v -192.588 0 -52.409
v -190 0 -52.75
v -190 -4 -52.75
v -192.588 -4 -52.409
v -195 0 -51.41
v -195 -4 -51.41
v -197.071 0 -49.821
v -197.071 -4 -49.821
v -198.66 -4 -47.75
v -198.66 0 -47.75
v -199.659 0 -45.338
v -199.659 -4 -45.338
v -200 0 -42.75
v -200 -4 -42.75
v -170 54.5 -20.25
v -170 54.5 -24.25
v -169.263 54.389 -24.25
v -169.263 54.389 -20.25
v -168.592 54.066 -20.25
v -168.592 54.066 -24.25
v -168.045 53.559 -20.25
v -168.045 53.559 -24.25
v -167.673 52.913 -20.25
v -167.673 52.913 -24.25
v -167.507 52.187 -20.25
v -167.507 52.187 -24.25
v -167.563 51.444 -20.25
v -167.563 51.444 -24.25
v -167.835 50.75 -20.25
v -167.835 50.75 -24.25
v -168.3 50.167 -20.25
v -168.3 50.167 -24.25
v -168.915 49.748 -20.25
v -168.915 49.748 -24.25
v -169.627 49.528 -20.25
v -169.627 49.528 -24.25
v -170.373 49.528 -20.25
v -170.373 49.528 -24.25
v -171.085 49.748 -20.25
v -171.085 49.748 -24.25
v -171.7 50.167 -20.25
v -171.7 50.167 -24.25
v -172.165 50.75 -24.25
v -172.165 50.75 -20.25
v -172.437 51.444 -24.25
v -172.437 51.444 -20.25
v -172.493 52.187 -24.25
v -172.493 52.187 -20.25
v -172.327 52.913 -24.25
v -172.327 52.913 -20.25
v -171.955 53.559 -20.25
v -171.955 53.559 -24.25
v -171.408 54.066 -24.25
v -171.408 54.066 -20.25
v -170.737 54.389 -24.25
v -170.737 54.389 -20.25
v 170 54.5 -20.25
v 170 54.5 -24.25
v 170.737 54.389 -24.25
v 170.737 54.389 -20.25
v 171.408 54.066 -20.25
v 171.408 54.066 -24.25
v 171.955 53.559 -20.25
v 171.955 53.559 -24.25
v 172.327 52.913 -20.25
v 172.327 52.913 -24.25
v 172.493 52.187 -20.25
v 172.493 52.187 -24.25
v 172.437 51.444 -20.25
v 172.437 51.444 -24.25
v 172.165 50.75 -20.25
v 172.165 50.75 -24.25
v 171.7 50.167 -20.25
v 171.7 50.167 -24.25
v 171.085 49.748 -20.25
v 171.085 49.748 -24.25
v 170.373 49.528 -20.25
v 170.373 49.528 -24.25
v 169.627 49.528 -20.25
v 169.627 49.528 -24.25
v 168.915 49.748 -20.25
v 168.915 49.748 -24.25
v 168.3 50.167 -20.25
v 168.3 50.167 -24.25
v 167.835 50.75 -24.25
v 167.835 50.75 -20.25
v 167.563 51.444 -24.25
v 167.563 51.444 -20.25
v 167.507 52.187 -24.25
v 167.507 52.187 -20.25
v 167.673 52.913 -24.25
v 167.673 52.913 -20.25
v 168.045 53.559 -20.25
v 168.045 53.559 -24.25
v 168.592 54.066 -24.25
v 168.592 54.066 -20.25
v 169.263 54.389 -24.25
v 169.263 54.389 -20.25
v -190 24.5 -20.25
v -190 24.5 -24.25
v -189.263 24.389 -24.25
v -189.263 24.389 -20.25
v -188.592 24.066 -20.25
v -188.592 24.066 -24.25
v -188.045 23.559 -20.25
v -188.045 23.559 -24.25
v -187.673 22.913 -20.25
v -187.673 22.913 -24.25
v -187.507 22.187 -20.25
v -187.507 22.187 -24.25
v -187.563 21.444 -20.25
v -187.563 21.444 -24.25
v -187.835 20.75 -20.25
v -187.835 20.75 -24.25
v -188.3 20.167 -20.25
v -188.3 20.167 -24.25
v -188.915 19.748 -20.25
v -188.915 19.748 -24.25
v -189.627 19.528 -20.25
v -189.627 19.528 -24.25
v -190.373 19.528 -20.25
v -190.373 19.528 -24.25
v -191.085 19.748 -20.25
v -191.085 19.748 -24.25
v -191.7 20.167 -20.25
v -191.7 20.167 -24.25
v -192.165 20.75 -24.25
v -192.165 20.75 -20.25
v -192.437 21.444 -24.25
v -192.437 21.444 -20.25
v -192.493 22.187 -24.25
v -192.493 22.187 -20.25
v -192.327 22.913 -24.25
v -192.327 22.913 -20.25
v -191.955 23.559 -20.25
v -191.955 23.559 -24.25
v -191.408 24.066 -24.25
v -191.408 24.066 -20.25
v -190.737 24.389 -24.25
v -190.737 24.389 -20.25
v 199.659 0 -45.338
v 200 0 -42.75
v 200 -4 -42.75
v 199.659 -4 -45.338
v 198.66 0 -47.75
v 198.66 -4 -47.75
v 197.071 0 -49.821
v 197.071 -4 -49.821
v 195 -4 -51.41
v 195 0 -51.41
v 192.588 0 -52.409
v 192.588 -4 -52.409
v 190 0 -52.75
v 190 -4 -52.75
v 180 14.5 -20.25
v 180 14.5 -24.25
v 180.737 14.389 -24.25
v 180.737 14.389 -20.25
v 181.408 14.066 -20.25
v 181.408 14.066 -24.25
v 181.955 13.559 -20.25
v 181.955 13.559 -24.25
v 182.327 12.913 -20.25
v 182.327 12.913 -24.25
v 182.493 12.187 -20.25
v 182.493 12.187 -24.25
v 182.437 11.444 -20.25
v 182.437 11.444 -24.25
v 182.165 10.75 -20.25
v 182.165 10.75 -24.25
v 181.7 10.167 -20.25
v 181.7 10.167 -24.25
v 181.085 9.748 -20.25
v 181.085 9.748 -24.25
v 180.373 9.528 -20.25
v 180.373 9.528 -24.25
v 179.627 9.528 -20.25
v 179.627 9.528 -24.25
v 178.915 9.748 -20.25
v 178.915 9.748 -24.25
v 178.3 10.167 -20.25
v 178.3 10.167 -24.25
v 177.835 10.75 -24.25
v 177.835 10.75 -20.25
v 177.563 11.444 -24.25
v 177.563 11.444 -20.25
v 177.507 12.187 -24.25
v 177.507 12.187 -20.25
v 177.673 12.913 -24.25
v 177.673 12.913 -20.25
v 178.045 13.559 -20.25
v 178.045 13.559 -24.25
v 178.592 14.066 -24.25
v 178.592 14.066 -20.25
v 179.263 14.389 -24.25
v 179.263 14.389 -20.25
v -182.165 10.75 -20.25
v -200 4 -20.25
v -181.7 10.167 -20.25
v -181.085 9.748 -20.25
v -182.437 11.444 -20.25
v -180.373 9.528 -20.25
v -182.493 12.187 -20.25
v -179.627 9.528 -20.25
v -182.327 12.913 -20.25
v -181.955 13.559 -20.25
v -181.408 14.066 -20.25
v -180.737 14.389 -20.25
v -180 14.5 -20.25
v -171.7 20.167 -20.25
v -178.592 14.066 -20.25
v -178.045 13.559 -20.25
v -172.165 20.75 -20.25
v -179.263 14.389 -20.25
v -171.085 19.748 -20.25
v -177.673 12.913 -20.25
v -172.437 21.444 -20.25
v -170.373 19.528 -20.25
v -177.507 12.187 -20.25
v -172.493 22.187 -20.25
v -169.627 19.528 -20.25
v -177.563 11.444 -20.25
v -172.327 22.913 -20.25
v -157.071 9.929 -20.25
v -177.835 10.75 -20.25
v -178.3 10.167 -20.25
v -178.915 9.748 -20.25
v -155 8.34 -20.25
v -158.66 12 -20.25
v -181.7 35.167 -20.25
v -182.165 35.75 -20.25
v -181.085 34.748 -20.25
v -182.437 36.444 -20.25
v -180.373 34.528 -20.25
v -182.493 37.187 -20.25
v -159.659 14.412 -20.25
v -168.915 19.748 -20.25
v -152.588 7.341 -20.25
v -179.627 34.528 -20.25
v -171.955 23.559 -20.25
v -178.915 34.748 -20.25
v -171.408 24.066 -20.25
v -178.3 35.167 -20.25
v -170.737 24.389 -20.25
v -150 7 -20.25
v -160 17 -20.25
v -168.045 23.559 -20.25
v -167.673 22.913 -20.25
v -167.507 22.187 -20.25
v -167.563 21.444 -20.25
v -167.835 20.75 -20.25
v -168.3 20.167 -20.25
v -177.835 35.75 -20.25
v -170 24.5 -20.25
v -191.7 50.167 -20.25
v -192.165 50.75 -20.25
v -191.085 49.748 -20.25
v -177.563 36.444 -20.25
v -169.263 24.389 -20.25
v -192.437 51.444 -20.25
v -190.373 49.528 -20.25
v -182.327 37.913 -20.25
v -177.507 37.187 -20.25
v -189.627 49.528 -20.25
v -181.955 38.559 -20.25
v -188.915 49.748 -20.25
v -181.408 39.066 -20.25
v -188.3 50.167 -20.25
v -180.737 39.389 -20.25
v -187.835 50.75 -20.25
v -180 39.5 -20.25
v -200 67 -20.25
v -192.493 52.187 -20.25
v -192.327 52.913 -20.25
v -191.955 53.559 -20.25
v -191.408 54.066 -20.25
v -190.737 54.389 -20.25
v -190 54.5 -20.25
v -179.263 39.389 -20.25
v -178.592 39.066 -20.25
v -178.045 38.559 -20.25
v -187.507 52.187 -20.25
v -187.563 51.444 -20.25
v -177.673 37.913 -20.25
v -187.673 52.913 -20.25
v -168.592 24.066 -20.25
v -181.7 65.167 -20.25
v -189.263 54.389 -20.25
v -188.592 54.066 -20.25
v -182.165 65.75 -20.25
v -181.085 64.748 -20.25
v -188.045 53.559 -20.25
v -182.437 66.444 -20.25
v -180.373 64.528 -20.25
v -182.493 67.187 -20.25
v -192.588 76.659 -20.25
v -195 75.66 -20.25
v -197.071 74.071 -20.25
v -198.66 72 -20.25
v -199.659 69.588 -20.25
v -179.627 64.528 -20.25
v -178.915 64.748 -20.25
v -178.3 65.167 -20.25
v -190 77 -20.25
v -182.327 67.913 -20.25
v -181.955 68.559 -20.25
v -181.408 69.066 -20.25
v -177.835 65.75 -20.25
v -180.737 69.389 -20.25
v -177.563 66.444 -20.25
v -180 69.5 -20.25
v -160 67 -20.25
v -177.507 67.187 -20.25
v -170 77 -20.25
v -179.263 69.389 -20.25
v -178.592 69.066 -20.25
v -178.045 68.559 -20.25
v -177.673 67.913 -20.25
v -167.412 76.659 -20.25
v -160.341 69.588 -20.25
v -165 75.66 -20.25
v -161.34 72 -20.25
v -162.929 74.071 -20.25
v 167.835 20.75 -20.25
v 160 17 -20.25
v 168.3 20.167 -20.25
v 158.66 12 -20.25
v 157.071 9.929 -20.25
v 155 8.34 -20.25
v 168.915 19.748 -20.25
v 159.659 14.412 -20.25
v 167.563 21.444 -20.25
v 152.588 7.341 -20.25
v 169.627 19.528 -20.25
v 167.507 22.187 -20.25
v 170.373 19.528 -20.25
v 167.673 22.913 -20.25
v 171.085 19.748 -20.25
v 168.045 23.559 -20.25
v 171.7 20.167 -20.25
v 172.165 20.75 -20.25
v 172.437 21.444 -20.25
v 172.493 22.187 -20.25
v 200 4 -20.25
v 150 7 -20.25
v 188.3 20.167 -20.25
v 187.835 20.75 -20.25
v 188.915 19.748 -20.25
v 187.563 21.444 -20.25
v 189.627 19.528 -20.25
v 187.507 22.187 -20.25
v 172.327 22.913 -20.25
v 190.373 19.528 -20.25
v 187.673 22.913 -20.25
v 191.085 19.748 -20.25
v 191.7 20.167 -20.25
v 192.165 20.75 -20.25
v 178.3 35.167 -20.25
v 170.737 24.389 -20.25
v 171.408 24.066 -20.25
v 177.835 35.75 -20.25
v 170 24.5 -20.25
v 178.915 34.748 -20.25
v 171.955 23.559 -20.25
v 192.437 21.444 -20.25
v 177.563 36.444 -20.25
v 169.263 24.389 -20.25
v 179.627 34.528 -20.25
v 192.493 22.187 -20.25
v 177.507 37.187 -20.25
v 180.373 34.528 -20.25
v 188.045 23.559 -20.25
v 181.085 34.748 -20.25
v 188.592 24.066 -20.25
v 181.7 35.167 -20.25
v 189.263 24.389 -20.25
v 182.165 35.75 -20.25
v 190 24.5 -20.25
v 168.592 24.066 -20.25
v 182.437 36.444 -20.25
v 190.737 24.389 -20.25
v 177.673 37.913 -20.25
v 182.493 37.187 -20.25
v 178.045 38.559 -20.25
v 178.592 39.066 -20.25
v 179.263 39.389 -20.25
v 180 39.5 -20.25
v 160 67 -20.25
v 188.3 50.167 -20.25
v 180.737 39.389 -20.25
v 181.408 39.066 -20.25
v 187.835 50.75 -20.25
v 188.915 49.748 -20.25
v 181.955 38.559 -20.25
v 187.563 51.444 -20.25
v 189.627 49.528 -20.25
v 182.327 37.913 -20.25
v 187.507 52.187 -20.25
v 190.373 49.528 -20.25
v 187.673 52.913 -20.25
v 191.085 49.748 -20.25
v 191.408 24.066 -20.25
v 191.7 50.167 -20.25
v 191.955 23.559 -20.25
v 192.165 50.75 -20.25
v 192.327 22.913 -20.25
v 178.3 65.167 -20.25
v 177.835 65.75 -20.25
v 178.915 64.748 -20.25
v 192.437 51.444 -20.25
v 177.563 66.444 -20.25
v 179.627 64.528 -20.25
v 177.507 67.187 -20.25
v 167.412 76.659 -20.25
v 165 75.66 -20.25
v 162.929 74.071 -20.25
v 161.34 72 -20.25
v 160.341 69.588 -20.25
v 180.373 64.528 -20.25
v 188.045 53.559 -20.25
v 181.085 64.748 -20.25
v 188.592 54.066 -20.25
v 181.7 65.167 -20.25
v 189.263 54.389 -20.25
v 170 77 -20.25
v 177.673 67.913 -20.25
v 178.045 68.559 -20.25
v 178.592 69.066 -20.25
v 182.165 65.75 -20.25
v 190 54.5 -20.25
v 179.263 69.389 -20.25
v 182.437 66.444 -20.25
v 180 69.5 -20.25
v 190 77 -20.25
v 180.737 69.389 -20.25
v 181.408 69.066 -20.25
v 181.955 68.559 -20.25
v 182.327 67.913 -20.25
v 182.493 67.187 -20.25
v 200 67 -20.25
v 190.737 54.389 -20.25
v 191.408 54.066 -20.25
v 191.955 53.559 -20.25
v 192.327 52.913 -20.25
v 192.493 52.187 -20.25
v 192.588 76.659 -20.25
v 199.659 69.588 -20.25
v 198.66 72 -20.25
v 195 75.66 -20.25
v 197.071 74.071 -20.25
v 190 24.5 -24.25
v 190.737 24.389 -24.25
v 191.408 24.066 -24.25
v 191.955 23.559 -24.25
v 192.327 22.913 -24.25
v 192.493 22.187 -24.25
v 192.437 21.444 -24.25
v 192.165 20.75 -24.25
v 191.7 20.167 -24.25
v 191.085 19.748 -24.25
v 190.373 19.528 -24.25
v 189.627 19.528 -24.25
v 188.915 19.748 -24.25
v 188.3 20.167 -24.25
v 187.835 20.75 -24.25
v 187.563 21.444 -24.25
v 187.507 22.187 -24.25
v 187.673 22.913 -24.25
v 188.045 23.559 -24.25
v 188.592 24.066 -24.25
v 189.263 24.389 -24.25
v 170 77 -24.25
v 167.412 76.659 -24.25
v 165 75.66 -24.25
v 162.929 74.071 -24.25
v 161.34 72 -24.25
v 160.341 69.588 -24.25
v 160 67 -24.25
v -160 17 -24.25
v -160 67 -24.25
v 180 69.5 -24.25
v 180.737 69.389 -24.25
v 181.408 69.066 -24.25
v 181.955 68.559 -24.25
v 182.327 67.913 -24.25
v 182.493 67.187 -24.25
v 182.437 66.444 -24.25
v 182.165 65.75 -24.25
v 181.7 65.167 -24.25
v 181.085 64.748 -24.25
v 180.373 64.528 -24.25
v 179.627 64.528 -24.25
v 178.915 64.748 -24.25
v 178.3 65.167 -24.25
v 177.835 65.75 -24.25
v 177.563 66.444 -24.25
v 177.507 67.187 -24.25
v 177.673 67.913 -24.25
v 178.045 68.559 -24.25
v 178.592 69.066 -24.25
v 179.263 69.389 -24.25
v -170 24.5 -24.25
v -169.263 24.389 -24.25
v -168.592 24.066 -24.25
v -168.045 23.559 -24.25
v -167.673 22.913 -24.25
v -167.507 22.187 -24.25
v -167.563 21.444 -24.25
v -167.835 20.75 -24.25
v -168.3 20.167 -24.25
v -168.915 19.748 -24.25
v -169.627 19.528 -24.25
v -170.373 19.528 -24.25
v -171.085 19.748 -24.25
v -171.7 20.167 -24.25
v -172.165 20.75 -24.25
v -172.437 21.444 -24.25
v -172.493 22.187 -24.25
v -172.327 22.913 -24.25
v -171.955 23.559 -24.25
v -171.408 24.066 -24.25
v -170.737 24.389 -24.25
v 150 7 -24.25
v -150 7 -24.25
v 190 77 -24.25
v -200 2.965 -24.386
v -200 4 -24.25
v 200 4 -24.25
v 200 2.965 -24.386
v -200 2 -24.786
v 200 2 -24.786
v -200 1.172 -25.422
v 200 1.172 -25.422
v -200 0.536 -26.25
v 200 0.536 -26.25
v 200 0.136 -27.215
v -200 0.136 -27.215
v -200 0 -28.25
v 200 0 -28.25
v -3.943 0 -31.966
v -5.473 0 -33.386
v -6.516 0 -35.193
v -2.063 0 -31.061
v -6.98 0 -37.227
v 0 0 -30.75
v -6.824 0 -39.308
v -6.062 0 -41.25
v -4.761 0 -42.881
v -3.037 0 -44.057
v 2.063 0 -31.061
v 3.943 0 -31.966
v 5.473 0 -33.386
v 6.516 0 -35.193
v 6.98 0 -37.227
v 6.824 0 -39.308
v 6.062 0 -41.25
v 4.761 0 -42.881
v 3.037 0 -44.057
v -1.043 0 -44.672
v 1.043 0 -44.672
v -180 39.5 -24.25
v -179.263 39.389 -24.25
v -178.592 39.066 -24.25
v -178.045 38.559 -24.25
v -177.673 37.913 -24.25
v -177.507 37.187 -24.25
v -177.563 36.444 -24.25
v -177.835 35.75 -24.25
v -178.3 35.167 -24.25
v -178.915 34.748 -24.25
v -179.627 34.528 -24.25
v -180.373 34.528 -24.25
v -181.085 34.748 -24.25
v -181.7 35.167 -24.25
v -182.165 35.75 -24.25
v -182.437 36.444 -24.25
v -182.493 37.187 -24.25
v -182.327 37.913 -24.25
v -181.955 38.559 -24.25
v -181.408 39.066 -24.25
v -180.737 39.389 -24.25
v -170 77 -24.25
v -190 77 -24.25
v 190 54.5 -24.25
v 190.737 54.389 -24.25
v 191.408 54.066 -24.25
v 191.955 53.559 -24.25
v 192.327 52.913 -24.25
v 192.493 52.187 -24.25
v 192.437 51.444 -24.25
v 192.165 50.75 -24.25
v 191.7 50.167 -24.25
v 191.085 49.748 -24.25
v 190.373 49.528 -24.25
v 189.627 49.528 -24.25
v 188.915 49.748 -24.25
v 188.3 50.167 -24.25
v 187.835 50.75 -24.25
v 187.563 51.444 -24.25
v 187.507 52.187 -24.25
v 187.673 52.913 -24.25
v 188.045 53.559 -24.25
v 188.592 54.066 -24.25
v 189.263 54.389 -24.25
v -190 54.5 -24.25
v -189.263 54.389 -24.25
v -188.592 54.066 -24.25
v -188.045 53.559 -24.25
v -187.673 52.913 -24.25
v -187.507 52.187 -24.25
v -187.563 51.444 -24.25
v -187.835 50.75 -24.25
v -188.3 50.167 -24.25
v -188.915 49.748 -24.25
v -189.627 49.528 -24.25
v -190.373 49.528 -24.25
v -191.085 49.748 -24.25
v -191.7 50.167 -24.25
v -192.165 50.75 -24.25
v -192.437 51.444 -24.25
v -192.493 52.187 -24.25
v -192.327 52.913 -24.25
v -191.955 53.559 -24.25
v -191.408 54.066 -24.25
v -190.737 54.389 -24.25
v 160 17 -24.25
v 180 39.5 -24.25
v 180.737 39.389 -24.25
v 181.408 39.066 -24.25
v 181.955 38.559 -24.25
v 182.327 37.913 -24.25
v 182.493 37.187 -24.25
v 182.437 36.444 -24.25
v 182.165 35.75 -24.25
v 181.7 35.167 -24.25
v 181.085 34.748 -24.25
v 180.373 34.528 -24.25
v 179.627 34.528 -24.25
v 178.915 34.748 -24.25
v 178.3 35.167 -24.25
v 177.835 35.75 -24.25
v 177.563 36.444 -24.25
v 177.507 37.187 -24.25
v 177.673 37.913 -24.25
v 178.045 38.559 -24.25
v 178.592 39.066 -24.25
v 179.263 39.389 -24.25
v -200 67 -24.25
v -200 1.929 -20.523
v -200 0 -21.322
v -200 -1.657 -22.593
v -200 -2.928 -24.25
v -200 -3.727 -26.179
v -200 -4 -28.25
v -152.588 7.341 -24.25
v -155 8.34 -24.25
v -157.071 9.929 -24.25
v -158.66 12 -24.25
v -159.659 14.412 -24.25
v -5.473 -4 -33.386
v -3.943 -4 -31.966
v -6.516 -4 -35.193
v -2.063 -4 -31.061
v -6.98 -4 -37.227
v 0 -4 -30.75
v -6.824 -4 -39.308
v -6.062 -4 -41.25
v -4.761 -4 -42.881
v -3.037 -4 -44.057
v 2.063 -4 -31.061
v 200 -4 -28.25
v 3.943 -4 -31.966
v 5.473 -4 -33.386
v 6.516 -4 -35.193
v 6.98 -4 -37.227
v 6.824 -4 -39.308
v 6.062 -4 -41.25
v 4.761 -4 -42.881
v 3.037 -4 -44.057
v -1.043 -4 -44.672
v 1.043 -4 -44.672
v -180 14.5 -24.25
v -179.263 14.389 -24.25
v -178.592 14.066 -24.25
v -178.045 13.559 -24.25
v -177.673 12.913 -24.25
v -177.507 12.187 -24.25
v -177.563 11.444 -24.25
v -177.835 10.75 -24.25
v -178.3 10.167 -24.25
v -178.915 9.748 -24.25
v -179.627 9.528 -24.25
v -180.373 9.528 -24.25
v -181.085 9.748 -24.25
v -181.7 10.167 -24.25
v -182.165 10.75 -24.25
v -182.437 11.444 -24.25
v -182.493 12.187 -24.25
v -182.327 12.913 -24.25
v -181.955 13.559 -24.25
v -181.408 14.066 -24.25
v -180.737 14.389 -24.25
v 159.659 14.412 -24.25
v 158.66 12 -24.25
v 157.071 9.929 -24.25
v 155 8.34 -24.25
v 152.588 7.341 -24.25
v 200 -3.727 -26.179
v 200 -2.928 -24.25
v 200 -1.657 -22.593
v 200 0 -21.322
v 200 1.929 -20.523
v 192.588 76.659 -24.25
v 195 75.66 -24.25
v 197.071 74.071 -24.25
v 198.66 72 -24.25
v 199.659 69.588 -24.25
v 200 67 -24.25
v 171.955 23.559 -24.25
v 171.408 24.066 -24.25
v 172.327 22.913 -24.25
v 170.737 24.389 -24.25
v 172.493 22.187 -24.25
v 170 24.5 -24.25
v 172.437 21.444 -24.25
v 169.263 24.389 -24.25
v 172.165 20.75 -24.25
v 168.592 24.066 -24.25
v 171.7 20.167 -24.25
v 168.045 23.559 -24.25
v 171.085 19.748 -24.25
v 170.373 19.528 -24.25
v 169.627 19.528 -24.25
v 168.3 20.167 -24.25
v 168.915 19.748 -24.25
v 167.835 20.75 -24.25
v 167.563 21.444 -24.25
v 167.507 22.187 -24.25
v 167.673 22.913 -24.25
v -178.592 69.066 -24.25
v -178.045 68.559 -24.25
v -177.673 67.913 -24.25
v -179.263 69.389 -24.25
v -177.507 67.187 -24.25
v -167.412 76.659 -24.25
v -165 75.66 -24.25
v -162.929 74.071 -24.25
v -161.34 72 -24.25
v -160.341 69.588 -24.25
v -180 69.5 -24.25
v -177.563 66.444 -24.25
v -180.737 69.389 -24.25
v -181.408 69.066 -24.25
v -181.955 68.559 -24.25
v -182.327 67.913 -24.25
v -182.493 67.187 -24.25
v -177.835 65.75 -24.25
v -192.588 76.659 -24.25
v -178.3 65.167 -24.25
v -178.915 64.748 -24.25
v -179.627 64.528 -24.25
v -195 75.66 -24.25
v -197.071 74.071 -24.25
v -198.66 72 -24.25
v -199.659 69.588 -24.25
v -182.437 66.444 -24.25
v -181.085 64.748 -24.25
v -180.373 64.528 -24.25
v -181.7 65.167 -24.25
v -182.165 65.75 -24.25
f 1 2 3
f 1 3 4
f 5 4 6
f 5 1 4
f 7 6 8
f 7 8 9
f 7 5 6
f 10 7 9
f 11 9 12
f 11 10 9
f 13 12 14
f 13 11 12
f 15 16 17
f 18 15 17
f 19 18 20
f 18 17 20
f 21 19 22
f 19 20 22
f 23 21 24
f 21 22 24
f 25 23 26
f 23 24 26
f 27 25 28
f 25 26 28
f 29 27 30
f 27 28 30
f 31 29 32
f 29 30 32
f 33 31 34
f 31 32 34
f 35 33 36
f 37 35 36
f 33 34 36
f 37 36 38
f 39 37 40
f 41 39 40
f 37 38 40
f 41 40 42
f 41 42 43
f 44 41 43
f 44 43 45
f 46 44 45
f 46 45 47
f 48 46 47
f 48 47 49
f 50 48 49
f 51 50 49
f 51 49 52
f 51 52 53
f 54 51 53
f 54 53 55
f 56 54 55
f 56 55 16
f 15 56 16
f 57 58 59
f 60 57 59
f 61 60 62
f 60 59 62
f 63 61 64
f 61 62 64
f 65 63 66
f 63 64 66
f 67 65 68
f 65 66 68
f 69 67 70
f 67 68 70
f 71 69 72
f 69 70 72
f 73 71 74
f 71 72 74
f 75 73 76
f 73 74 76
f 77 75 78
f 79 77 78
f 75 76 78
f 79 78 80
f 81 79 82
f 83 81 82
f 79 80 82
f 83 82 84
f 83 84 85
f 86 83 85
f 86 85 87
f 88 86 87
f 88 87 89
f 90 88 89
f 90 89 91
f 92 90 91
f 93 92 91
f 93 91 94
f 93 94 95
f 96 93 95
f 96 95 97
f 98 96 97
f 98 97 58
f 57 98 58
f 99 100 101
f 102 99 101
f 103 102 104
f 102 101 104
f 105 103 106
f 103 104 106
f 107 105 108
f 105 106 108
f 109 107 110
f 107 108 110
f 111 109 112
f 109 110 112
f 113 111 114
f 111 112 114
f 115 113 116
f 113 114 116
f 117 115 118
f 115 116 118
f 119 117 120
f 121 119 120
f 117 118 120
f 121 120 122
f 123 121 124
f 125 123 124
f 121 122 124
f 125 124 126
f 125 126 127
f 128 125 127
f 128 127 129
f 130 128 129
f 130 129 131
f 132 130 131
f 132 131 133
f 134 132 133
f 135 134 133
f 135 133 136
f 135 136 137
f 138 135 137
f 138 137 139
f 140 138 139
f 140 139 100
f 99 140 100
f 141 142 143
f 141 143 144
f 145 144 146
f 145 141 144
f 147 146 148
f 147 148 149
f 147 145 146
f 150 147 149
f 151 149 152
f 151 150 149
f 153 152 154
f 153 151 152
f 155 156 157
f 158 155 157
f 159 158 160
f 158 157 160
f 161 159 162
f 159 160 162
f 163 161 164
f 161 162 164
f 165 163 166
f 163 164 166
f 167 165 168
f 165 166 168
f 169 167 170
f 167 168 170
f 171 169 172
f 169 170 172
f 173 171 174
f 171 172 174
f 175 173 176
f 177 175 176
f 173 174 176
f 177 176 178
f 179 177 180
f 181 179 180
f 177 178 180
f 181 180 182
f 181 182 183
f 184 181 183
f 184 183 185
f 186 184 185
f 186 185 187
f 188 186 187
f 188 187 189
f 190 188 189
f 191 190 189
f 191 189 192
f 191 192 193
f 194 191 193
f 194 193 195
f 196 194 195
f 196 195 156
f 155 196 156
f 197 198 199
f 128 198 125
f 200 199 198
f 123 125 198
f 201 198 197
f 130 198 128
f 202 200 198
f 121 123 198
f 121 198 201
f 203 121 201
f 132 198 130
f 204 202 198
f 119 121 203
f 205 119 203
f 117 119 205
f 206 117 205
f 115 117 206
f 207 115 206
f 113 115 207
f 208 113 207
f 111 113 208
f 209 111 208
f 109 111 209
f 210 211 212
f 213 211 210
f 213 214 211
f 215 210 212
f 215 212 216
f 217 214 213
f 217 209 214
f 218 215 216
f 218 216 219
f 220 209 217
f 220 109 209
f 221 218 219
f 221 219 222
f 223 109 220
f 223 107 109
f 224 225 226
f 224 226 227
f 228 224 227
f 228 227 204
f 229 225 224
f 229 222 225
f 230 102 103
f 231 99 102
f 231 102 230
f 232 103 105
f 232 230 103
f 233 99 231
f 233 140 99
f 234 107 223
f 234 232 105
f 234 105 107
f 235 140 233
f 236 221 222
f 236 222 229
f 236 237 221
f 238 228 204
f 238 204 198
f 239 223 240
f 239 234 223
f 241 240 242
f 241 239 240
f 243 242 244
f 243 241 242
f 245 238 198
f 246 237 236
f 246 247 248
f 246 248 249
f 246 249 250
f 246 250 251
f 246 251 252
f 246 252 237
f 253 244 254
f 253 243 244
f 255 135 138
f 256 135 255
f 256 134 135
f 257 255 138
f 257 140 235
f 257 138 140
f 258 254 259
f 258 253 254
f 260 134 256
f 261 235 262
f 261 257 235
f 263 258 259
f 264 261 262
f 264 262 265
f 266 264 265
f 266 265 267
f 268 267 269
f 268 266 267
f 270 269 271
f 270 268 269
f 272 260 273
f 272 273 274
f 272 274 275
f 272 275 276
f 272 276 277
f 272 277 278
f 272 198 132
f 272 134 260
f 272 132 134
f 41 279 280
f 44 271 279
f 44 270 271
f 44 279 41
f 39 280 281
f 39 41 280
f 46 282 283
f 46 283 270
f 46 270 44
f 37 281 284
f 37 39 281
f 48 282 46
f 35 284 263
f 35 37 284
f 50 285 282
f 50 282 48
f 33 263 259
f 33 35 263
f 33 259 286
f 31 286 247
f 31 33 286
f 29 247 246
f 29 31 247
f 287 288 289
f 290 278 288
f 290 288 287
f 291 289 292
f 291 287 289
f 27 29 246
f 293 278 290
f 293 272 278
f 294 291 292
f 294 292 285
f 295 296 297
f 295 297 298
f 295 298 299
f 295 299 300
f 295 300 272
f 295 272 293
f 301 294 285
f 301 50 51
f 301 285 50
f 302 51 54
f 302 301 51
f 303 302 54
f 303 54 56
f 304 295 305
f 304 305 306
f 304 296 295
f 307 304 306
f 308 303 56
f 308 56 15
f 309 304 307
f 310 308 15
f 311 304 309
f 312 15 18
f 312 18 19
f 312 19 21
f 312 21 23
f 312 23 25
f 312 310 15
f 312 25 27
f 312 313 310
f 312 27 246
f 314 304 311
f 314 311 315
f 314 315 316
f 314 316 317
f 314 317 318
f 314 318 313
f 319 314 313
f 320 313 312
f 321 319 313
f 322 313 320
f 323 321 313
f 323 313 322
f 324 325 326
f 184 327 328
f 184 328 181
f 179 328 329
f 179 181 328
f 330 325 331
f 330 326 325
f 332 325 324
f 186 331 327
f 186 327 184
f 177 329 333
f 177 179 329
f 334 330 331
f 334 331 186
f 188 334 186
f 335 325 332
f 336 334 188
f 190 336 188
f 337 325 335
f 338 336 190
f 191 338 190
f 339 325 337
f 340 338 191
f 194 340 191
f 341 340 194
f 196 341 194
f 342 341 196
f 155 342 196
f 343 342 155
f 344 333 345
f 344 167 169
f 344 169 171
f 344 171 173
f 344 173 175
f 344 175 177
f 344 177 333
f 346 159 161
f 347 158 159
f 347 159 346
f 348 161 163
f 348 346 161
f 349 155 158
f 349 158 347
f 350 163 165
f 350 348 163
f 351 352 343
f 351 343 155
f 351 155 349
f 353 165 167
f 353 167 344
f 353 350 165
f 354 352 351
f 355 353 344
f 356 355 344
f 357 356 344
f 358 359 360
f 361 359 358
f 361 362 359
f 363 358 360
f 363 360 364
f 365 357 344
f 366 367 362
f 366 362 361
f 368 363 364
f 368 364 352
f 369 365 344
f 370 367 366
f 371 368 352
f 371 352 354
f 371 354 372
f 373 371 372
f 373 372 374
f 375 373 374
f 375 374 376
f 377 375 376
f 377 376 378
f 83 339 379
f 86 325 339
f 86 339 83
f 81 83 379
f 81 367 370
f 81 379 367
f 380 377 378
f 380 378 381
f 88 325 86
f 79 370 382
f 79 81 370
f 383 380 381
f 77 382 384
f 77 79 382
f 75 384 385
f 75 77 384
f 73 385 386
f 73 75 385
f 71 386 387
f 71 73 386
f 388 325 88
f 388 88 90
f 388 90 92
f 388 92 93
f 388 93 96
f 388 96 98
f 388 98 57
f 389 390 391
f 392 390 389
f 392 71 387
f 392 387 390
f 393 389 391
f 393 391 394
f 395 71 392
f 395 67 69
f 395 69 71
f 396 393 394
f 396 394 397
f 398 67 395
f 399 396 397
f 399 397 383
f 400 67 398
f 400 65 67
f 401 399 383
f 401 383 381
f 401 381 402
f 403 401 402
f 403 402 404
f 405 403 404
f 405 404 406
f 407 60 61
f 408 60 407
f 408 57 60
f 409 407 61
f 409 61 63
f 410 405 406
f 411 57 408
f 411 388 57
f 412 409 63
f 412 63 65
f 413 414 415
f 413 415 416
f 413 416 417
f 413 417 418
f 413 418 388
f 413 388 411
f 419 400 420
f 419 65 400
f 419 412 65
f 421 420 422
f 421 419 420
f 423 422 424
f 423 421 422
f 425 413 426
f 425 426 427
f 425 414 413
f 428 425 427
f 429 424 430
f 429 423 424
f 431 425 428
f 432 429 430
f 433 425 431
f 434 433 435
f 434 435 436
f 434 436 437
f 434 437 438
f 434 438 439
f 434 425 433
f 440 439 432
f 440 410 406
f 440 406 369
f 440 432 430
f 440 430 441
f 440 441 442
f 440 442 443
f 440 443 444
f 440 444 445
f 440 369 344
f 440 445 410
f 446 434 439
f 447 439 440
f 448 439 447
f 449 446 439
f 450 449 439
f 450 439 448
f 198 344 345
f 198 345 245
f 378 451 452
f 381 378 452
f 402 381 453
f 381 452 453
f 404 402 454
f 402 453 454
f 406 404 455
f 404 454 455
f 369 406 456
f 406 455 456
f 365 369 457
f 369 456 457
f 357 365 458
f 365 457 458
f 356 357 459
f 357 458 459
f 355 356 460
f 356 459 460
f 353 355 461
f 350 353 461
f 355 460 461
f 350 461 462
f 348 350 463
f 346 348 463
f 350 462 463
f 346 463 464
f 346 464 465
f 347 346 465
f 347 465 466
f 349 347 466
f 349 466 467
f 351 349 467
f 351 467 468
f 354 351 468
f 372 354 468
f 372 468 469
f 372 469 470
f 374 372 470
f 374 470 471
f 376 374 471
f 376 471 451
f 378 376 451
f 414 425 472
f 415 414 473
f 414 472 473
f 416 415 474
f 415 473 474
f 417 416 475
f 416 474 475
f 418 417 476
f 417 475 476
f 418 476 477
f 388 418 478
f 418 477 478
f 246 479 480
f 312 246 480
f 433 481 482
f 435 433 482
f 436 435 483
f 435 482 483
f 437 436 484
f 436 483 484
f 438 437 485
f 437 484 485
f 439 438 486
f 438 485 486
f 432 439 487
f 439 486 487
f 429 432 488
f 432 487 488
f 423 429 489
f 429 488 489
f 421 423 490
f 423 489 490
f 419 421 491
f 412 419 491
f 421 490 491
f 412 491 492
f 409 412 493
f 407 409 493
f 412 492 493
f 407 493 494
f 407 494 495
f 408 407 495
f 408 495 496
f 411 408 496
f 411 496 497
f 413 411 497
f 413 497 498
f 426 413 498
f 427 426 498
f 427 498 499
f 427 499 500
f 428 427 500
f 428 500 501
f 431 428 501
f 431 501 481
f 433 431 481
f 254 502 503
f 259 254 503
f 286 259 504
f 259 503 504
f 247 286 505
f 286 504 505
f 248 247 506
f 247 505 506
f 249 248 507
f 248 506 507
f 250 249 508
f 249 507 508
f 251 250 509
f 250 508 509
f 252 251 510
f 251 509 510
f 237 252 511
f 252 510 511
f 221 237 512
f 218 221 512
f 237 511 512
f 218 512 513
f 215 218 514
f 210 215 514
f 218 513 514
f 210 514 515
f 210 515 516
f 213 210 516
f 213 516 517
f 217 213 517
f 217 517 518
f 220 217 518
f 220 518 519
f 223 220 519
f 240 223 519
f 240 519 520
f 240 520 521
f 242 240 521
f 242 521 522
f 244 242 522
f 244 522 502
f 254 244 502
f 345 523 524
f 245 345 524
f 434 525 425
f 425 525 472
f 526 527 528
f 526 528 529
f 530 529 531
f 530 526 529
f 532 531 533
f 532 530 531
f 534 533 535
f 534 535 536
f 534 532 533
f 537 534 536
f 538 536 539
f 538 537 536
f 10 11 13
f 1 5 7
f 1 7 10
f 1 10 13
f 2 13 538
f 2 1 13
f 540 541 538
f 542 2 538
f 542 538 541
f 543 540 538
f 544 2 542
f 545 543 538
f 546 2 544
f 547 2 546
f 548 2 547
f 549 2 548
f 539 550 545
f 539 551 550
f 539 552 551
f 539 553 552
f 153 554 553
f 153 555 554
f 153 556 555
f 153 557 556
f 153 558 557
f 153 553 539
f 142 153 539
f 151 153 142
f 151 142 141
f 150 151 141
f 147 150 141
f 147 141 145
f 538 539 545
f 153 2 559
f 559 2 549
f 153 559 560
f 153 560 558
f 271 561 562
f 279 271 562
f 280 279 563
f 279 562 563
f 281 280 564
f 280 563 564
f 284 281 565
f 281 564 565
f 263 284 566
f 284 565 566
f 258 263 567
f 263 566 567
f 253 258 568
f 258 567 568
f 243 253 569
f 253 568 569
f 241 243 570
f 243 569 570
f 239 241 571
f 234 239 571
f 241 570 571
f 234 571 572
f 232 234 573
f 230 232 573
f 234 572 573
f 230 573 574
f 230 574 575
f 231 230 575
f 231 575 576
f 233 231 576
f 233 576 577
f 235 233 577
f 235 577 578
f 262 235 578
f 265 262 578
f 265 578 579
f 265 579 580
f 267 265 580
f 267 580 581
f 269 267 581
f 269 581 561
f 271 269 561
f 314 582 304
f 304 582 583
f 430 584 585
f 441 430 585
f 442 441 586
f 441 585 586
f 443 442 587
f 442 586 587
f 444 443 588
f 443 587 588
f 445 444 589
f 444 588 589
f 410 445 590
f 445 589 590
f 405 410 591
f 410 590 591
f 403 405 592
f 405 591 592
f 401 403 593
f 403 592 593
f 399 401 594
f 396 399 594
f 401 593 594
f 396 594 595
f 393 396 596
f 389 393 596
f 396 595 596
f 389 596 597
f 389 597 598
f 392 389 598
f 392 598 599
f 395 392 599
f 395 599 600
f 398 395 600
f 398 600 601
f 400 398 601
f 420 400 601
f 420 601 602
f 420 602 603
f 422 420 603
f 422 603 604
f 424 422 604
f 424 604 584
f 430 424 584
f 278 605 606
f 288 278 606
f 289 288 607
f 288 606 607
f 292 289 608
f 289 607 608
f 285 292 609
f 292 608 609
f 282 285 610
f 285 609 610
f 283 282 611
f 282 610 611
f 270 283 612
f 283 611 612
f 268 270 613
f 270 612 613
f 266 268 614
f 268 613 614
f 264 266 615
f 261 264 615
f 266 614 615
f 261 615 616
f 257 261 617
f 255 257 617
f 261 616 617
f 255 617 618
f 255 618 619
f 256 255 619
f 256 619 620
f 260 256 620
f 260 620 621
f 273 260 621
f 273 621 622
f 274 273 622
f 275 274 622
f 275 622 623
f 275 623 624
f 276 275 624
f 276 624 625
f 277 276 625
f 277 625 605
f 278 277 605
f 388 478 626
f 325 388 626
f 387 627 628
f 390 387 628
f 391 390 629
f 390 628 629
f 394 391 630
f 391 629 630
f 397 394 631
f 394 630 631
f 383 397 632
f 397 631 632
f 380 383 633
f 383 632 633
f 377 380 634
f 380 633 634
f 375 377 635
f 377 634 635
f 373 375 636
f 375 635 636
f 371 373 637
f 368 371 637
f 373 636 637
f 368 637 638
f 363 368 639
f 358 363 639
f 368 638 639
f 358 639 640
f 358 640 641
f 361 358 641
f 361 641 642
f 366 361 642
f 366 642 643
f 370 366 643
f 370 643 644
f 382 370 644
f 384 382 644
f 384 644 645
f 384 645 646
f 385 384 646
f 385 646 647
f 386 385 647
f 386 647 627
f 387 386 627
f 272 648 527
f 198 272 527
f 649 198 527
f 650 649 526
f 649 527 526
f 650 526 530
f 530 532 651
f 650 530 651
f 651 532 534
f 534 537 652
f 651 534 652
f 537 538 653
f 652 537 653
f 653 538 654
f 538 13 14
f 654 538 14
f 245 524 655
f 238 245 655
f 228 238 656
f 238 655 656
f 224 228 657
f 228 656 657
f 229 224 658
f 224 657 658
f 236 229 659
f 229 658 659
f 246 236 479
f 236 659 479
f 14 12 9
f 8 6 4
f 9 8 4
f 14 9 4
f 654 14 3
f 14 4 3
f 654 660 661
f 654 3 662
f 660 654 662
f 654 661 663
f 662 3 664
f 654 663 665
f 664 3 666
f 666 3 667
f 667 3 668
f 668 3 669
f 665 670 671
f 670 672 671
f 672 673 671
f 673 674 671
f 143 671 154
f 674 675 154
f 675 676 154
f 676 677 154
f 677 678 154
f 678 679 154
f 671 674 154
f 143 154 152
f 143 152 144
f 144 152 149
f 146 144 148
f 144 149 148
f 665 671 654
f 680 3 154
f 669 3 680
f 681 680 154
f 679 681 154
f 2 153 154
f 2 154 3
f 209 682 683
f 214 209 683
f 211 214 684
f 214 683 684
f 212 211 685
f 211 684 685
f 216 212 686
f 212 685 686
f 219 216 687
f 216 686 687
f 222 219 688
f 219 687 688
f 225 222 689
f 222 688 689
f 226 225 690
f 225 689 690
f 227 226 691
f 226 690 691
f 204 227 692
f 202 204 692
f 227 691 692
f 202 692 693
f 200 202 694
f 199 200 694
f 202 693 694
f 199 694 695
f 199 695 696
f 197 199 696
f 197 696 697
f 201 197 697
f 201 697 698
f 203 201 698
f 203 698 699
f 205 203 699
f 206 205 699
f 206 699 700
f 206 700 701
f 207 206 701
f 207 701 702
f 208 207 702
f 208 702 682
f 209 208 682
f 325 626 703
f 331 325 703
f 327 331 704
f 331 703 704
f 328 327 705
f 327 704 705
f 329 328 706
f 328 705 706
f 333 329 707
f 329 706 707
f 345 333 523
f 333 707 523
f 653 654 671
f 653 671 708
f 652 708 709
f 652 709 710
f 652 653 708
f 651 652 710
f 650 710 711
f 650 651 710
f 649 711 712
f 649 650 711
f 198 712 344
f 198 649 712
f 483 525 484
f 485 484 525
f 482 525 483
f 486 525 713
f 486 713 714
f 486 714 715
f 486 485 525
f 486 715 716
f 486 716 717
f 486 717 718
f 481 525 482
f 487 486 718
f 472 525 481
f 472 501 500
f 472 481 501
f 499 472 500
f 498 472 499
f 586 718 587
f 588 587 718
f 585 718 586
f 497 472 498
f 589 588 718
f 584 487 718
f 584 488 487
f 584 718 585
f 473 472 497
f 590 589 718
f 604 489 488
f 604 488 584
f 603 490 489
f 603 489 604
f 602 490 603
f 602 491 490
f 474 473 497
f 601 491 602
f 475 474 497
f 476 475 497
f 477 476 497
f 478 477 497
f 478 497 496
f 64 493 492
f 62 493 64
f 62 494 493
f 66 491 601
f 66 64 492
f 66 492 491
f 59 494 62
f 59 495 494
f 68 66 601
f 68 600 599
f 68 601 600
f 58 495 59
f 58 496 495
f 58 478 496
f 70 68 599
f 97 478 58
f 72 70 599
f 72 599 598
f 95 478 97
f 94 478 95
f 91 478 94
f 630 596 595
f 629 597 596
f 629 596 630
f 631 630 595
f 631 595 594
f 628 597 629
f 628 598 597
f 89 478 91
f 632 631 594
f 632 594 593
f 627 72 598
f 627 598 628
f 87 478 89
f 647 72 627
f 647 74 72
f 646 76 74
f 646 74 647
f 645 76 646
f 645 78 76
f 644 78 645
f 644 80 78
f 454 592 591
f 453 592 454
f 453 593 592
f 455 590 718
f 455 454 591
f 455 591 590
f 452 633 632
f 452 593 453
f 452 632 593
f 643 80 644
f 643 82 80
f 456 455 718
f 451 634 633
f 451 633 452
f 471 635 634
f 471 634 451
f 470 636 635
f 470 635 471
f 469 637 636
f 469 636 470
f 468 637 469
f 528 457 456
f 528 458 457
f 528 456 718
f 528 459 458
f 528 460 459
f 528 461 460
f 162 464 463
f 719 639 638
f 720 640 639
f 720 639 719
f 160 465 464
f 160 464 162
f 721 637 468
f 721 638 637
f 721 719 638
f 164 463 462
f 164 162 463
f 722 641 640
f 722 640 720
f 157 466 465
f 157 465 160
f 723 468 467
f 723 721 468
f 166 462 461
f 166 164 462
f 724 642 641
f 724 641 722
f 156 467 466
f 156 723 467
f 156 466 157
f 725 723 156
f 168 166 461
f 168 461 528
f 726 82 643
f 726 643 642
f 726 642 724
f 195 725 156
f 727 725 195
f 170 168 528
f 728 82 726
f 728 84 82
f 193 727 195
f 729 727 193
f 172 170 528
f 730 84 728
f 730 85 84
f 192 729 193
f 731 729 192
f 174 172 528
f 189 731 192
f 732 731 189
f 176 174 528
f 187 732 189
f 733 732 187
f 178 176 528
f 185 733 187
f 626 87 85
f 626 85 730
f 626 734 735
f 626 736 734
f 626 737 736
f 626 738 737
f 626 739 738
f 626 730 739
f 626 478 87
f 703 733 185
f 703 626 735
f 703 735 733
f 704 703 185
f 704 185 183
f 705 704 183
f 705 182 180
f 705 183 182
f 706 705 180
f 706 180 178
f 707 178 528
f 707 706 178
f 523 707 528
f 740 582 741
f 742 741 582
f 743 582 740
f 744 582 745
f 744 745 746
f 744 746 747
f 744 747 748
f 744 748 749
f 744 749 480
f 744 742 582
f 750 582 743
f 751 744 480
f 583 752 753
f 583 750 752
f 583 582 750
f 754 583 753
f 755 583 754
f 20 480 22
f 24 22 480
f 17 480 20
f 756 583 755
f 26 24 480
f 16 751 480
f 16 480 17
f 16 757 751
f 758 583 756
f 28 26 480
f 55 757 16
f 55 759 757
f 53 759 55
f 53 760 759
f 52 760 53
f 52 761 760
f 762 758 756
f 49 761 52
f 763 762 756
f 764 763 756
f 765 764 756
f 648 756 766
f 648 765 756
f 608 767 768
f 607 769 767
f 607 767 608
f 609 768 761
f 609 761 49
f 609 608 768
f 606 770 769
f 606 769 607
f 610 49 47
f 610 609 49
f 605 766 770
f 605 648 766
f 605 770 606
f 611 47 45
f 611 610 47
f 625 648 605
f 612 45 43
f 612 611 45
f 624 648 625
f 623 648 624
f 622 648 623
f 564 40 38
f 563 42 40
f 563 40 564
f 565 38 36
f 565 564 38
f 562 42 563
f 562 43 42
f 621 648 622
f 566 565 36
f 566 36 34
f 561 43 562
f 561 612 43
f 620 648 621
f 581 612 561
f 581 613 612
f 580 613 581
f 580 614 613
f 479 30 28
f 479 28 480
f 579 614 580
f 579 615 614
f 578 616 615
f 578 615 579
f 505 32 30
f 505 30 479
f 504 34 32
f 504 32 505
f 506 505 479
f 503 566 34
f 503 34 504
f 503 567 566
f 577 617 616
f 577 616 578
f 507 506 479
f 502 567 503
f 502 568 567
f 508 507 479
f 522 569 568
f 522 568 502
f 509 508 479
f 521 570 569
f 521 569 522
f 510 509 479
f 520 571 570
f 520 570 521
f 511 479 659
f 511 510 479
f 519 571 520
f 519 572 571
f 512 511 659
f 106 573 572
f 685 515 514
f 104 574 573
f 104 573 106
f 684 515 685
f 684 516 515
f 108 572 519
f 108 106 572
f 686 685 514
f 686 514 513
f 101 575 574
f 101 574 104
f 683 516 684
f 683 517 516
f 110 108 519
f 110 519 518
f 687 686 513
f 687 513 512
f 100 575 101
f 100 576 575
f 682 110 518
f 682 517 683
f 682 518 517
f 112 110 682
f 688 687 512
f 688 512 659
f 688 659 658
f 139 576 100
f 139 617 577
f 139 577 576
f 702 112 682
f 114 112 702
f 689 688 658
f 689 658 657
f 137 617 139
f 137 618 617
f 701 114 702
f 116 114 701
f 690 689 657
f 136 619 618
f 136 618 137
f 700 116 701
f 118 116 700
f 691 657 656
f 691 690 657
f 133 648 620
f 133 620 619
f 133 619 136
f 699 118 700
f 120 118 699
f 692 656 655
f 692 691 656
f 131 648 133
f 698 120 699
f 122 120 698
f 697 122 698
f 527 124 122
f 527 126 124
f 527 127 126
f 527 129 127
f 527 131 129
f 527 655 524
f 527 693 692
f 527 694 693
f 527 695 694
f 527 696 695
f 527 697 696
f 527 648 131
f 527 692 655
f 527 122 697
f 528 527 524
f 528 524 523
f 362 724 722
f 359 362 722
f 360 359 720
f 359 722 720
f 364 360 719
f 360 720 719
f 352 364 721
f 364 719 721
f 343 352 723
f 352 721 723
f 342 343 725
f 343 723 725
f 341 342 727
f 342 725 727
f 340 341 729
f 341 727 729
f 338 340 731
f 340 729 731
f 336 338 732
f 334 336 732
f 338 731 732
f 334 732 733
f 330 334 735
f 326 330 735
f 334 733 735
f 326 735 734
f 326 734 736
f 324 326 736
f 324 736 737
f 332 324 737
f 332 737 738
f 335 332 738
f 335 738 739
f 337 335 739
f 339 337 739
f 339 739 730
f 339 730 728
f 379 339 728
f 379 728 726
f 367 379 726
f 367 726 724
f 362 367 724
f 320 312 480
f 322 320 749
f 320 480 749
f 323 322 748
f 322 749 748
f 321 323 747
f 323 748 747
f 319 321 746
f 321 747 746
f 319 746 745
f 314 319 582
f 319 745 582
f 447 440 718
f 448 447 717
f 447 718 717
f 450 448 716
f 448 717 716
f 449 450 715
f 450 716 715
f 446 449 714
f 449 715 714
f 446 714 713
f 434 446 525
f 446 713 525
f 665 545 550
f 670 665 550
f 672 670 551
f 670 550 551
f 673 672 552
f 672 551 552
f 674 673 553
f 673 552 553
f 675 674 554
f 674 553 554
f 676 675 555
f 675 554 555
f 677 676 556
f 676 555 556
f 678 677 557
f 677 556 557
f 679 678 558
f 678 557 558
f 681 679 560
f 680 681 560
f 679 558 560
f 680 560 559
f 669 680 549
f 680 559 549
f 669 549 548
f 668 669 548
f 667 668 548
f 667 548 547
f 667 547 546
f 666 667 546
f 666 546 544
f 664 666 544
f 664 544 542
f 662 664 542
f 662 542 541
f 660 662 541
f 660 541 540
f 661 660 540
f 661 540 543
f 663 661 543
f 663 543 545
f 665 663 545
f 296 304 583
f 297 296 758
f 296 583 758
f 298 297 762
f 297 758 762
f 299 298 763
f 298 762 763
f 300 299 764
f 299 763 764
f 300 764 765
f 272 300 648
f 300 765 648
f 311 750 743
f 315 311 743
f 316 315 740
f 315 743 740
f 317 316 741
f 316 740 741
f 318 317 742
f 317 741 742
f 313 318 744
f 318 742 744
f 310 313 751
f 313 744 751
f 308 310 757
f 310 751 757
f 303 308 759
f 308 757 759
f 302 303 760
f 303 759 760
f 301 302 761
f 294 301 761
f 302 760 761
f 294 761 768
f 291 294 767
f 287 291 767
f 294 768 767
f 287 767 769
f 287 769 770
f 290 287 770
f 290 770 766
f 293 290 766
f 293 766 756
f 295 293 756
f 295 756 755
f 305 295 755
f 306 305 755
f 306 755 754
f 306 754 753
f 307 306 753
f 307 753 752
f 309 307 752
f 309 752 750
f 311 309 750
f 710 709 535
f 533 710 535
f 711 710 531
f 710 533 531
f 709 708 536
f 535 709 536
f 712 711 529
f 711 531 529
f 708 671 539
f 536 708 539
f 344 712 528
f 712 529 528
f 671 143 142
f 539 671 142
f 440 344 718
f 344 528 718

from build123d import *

# Parameters (mm, degrees)
BRIDA_BASE1_DEPTH             = 4
PLIEGUE_START                 = -21.07192
PLIEGUE_CROQUIZADO1_OUTLINE_W = 400
PLIEGUE_CROQUIZADO1_OUTLINE_H = 4
PLIEGUE_CROQUIZADO1_DEPTH     = 73.82192
PLIEGUE_START_2               = -24.25
PLIEGUE_CROQUIZADO1_2_DEPTH   = 0.02192
PLIEGUE_START_3               = -28.25
PLIEGUE_CROQUIZADO1_3_DEPTH   = 8
PLIEGUE_START_4               = -200
PLIEGUE_CROQUIZADO1_4_DEPTH   = 400
CROQUIS8_R                    = 7
CORTAR_EXTRUIR2_DEPTH         = 10
CORTAR_EXTRUIR3_REACH         = 218.197
CROQUIS9_R                    = 2.5


with BuildPart() as part:
    # Brida base1: sheet metal written as solids
    # Croquis1 → Brida base1 (new body)
    with BuildSketch(Plane(origin=(0, 0, 0), x_dir=(1, 0, 0), z_dir=(0, 1, 0))):
        with BuildLine():
            Line((170, -52.75), (190, -52.75))
            ThreePointArc((190, -52.75), (197.071067812, -49.821067812), (200, -42.75))
            Line((200, -42.75), (200, 42.75))
            ThreePointArc((200, 42.75), (197.071067812, 49.821067812), (190, 52.75))
            Line((190, 52.75), (-190, 52.75))
            ThreePointArc((-190, 52.75), (-197.071067812, 49.821067812), (-200, 42.75))
            Line((-200, 42.75), (-200, -42.75))
            ThreePointArc((-200, -42.75), (-197.071067812, -49.821067812), (-190, -52.75))
            Line((-190, -52.75), (-170, -52.75))
            ThreePointArc((-170, -52.75), (-162.928932188, -49.821067812), (-160, -42.75))
            Line((-160, -42.75), (-160, 7.25))
            ThreePointArc((-160, 7.25), (-157.071067812, 14.321067812), (-150, 17.25))
            Line((-150, 17.25), (150, 17.25))
            ThreePointArc((150, 17.25), (157.071067812, 14.321067812), (160, 7.25))
            Line((160, 7.25), (160, -42.75))
            ThreePointArc((160, -42.75), (162.928932188, -49.821067812), (170, -52.75))
        make_face()
    extrude(amount=-BRIDA_BASE1_DEPTH)

    # Pliegue croquizado1: read off the stored shape, not the designer's step
    # Pliegue croquizado1 outline → Pliegue croquizado1 (cut)
    with BuildSketch(Plane.XY.offset(PLIEGUE_START)):
        with Locations((0, -2)):
            Rectangle(PLIEGUE_CROQUIZADO1_OUTLINE_W, PLIEGUE_CROQUIZADO1_OUTLINE_H)
    extrude(amount=PLIEGUE_CROQUIZADO1_DEPTH, mode=Mode.SUBTRACT)

    # Pliegue croquizado1 2 outline → Pliegue croquizado1 2 (add)
    with BuildSketch(Plane.XY.offset(PLIEGUE_START_2)):
        with BuildLine():
            ThreePointArc((-190, 76.999999998), (-197.071067812, 74.07106781), (-200, 66.999999998))
            Line((-200, 66.999999998), (-200, 0))
            Line((-200, 0), (200, 0))
            Line((200, 0), (200, 66.999999998))
            ThreePointArc((200, 66.999999998), (197.071067812, 74.07106781), (190, 76.999999998))
            Line((190, 76.999999998), (170, 76.999999998))
            ThreePointArc((170, 76.999999998), (162.928932188, 74.07106781), (160, 66.999999998))
            Line((160, 66.999999998), (160, 16.999999998))
            ThreePointArc((160, 16.999999998), (157.071067812, 9.928932186), (150, 6.999999998))
            Line((150, 6.999999998), (-150, 6.999999998))
            ThreePointArc((-150, 6.999999998), (-157.071067812, 9.928932186), (-160, 16.999999998))
            Line((-160, 16.999999998), (-160, 66.999999998))
            ThreePointArc((-160, 66.999999998), (-162.928932188, 74.07106781), (-170, 76.999999998))
            Line((-170, 76.999999998), (-190, 76.999999998))
        make_face()
    extrude(amount=PLIEGUE_CROQUIZADO1_2_DEPTH)

    # Pliegue croquizado1 3 outline → Pliegue croquizado1 3 (add)
    with BuildSketch(Plane.XY.offset(PLIEGUE_START_3)):
        with BuildLine():
            ThreePointArc((-190, 76.999999998), (-197.071067812, 74.07106781), (-200, 66.999999998))
            Line((-200, 66.999999998), (-200, 0))
            Line((-200, 0), (200, 0))
            Line((200, 0), (200, 66.999999998))
            ThreePointArc((200, 66.999999998), (197.071067812, 74.07106781), (190, 76.999999998))
            Line((190, 76.999999998), (170, 76.999999998))
            ThreePointArc((170, 76.999999998), (162.928932188, 74.07106781), (160, 66.999999998))
            Line((160, 66.999999998), (160, 16.999999998))
            ThreePointArc((160, 16.999999998), (157.071067812, 9.928932186), (150, 6.999999998))
            Line((150, 6.999999998), (-150, 6.999999998))
            ThreePointArc((-150, 6.999999998), (-157.071067812, 9.928932186), (-160, 16.999999998))
            Line((-160, 16.999999998), (-160, 66.999999998))
            ThreePointArc((-160, 66.999999998), (-162.928932188, 74.07106781), (-170, 76.999999998))
            Line((-170, 76.999999998), (-190, 76.999999998))
        make_face()
    extrude(amount=PLIEGUE_CROQUIZADO1_3_DEPTH)

    # Pliegue croquizado1 4 outline → Pliegue croquizado1 4 (cut)
    with BuildSketch(Plane.YZ.offset(PLIEGUE_START_4)):
        with BuildLine():
            ThreePointArc((-4, -28.25), (-1.656854249, -22.593145751), (4, -20.25))
            Line((4, -20.25), (0, -20.25))
            Line((0, -20.25), (0, -21.07192))
            Line((0, -21.07192), (-4, -21.07192))
            Line((-4, -21.07192), (-4, -28.25))
        make_face()
        with BuildLine():
            ThreePointArc((4, -24.25), (1.171572875, -25.421572875), (0, -28.25))
            Line((0, -28.25), (76.999999998, -28.25))
            Line((76.999999998, -28.25), (76.999999998, -24.25))
            Line((76.999999998, -24.25), (4, -24.25))
        make_face()
    extrude(amount=PLIEGUE_CROQUIZADO1_4_DEPTH, mode=Mode.SUBTRACT)

    # Croquis8 → Cortar-Extruir2 (cut)
    with BuildSketch(Plane(origin=(0, 0, 0), x_dir=(1, 0, 0), z_dir=(0, 1, 0))):
        with Locations(Location((0, 37.75, 0), (0, 0, 270))):
            Circle(CROQUIS8_R)
    extrude(amount=-CORTAR_EXTRUIR2_DEPTH, mode=Mode.SUBTRACT)

    # Croquis9 → Cortar-Extruir3 (cut, up to next)
    with BuildSketch(Plane(origin=(0, 0, -24.25), x_dir=(-1, 0, 0), z_dir=(0, 0, -1)), mode=Mode.PRIVATE) as cortar_extruir3_sk1:
        with Locations(Location((180, 11.999999998, 0), (0, 0, 90))):
            Circle(CROQUIS9_R)
    cortar_extruir3_tool1 = extrude(cortar_extruir3_sk1.sketch, amount=-CORTAR_EXTRUIR3_REACH, mode=Mode.PRIVATE) & part.part
    # Croquis9 → Cortar-Extruir3 (cut, up to next)
    with BuildSketch(Plane(origin=(0, 0, -24.25), x_dir=(-1, 0, 0), z_dir=(0, 0, -1)), mode=Mode.PRIVATE) as cortar_extruir3_sk2:
        with Locations(Location((180, 66.999999998, 0), (0, 0, 90))):
            Circle(CROQUIS9_R)
    cortar_extruir3_tool2 = extrude(cortar_extruir3_sk2.sketch, amount=-CORTAR_EXTRUIR3_REACH, mode=Mode.PRIVATE) & part.part
    # Croquis9 → Cortar-Extruir3 (cut, up to next)
    with BuildSketch(Plane(origin=(0, 0, -24.25), x_dir=(-1, 0, 0), z_dir=(0, 0, -1)), mode=Mode.PRIVATE) as cortar_extruir3_sk3:
        with Locations(Location((170, 51.999999998, 0), (0, 0, 90))):
            Circle(CROQUIS9_R)
    cortar_extruir3_tool3 = extrude(cortar_extruir3_sk3.sketch, amount=-CORTAR_EXTRUIR3_REACH, mode=Mode.PRIVATE) & part.part
    # Croquis9 → Cortar-Extruir3 (cut, up to next)
    with BuildSketch(Plane(origin=(0, 0, -24.25), x_dir=(-1, 0, 0), z_dir=(0, 0, -1)), mode=Mode.PRIVATE) as cortar_extruir3_sk4:
        with Locations(Location((190, 51.999999998, 0), (0, 0, 90))):
            Circle(CROQUIS9_R)
    cortar_extruir3_tool4 = extrude(cortar_extruir3_sk4.sketch, amount=-CORTAR_EXTRUIR3_REACH, mode=Mode.PRIVATE) & part.part
    # Croquis9 → Cortar-Extruir3 (cut, up to next)
    with BuildSketch(Plane(origin=(0, 0, -24.25), x_dir=(-1, 0, 0), z_dir=(0, 0, -1)), mode=Mode.PRIVATE) as cortar_extruir3_sk5:
        with Locations(Location((180, 36.999999998, 0), (0, 0, 90))):
            Circle(CROQUIS9_R)
    cortar_extruir3_tool5 = extrude(cortar_extruir3_sk5.sketch, amount=-CORTAR_EXTRUIR3_REACH, mode=Mode.PRIVATE) & part.part
    # Croquis9 → Cortar-Extruir3 (cut, up to next)
    with BuildSketch(Plane(origin=(0, 0, -24.25), x_dir=(-1, 0, 0), z_dir=(0, 0, -1)), mode=Mode.PRIVATE) as cortar_extruir3_sk6:
        with Locations(Location((170, 21.999999998, 0), (0, 0, 90))):
            Circle(CROQUIS9_R)
    cortar_extruir3_tool6 = extrude(cortar_extruir3_sk6.sketch, amount=-CORTAR_EXTRUIR3_REACH, mode=Mode.PRIVATE) & part.part
    # Croquis9 → Cortar-Extruir3 (cut, up to next)
    with BuildSketch(Plane(origin=(0, 0, -24.25), x_dir=(-1, 0, 0), z_dir=(0, 0, -1)), mode=Mode.PRIVATE) as cortar_extruir3_sk7:
        with Locations(Location((190, 21.999999998, 0), (0, 0, 90))):
            Circle(CROQUIS9_R)
    cortar_extruir3_tool7 = extrude(cortar_extruir3_sk7.sketch, amount=-CORTAR_EXTRUIR3_REACH, mode=Mode.PRIVATE) & part.part
    # Croquis9 → Cortar-Extruir3 (cut, up to next)
    with BuildSketch(Plane(origin=(0, 0, -24.25), x_dir=(-1, 0, 0), z_dir=(0, 0, -1)), mode=Mode.PRIVATE) as cortar_extruir3_sk8:
        with Locations(Location((-190, 21.999999998, 0), (0, 0, 90))):
            Circle(CROQUIS9_R)
    cortar_extruir3_tool8 = extrude(cortar_extruir3_sk8.sketch, amount=-CORTAR_EXTRUIR3_REACH, mode=Mode.PRIVATE) & part.part
    # Croquis9 → Cortar-Extruir3 (cut, up to next)
    with BuildSketch(Plane(origin=(0, 0, -24.25), x_dir=(-1, 0, 0), z_dir=(0, 0, -1)), mode=Mode.PRIVATE) as cortar_extruir3_sk9:
        with Locations(Location((-170, 21.999999998, 0), (0, 0, 90))):
            Circle(CROQUIS9_R)
    cortar_extruir3_tool9 = extrude(cortar_extruir3_sk9.sketch, amount=-CORTAR_EXTRUIR3_REACH, mode=Mode.PRIVATE) & part.part
    # Croquis9 → Cortar-Extruir3 (cut, up to next)
    with BuildSketch(Plane(origin=(0, 0, -24.25), x_dir=(-1, 0, 0), z_dir=(0, 0, -1)), mode=Mode.PRIVATE) as cortar_extruir3_sk10:
        with Locations(Location((-180, 36.999999998, 0), (0, 0, 90))):
            Circle(CROQUIS9_R)
    cortar_extruir3_tool10 = extrude(cortar_extruir3_sk10.sketch, amount=-CORTAR_EXTRUIR3_REACH, mode=Mode.PRIVATE) & part.part
    # Croquis9 → Cortar-Extruir3 (cut, up to next)
    with BuildSketch(Plane(origin=(0, 0, -24.25), x_dir=(-1, 0, 0), z_dir=(0, 0, -1)), mode=Mode.PRIVATE) as cortar_extruir3_sk11:
        with Locations(Location((-190, 51.999999998, 0), (0, 0, 90))):
            Circle(CROQUIS9_R)
    cortar_extruir3_tool11 = extrude(cortar_extruir3_sk11.sketch, amount=-CORTAR_EXTRUIR3_REACH, mode=Mode.PRIVATE) & part.part
    # Croquis9 → Cortar-Extruir3 (cut, up to next)
    with BuildSketch(Plane(origin=(0, 0, -24.25), x_dir=(-1, 0, 0), z_dir=(0, 0, -1)), mode=Mode.PRIVATE) as cortar_extruir3_sk12:
        with Locations(Location((-170, 51.999999998, 0), (0, 0, 90))):
            Circle(CROQUIS9_R)
    cortar_extruir3_tool12 = extrude(cortar_extruir3_sk12.sketch, amount=-CORTAR_EXTRUIR3_REACH, mode=Mode.PRIVATE) & part.part
    # Croquis9 → Cortar-Extruir3 (cut, up to next)
    with BuildSketch(Plane(origin=(0, 0, -24.25), x_dir=(-1, 0, 0), z_dir=(0, 0, -1)), mode=Mode.PRIVATE) as cortar_extruir3_sk13:
        with Locations(Location((-180, 66.999999998, 0), (0, 0, 90))):
            Circle(CROQUIS9_R)
    cortar_extruir3_tool13 = extrude(cortar_extruir3_sk13.sketch, amount=-CORTAR_EXTRUIR3_REACH, mode=Mode.PRIVATE) & part.part
    # Croquis9 → Cortar-Extruir3 (cut, up to next)
    with BuildSketch(Plane(origin=(0, 0, -24.25), x_dir=(-1, 0, 0), z_dir=(0, 0, -1)), mode=Mode.PRIVATE) as cortar_extruir3_sk14:
        with Locations(Location((-180, 11.999999998, 0), (0, 0, 90))):
            Circle(CROQUIS9_R)
    cortar_extruir3_tool14 = extrude(cortar_extruir3_sk14.sketch, amount=-CORTAR_EXTRUIR3_REACH, mode=Mode.PRIVATE) & part.part
    add(cortar_extruir3_tool1.solids().sort_by_distance((-180, 12, -24.25))[0], mode=Mode.SUBTRACT)
    add(cortar_extruir3_tool2.solids().sort_by_distance((-180, 67, -24.25))[0], mode=Mode.SUBTRACT)
    add(cortar_extruir3_tool3.solids().sort_by_distance((-170, 52, -24.25))[0], mode=Mode.SUBTRACT)
    add(cortar_extruir3_tool4.solids().sort_by_distance((-190, 52, -24.25))[0], mode=Mode.SUBTRACT)
    add(cortar_extruir3_tool5.solids().sort_by_distance((-180, 37, -24.25))[0], mode=Mode.SUBTRACT)
    add(cortar_extruir3_tool6.solids().sort_by_distance((-170, 22, -24.25))[0], mode=Mode.SUBTRACT)
    add(cortar_extruir3_tool7.solids().sort_by_distance((-190, 22, -24.25))[0], mode=Mode.SUBTRACT)
    add(cortar_extruir3_tool8.solids().sort_by_distance((190, 22, -24.25))[0], mode=Mode.SUBTRACT)
    add(cortar_extruir3_tool9.solids().sort_by_distance((170, 22, -24.25))[0], mode=Mode.SUBTRACT)
    add(cortar_extruir3_tool10.solids().sort_by_distance((180, 37, -24.25))[0], mode=Mode.SUBTRACT)
    add(cortar_extruir3_tool11.solids().sort_by_distance((190, 52, -24.25))[0], mode=Mode.SUBTRACT)
    add(cortar_extruir3_tool12.solids().sort_by_distance((170, 52, -24.25))[0], mode=Mode.SUBTRACT)
    add(cortar_extruir3_tool13.solids().sort_by_distance((180, 67, -24.25))[0], mode=Mode.SUBTRACT)
    add(cortar_extruir3_tool14.solids().sort_by_distance((180, 12, -24.25))[0], mode=Mode.SUBTRACT)


solid = part.part
